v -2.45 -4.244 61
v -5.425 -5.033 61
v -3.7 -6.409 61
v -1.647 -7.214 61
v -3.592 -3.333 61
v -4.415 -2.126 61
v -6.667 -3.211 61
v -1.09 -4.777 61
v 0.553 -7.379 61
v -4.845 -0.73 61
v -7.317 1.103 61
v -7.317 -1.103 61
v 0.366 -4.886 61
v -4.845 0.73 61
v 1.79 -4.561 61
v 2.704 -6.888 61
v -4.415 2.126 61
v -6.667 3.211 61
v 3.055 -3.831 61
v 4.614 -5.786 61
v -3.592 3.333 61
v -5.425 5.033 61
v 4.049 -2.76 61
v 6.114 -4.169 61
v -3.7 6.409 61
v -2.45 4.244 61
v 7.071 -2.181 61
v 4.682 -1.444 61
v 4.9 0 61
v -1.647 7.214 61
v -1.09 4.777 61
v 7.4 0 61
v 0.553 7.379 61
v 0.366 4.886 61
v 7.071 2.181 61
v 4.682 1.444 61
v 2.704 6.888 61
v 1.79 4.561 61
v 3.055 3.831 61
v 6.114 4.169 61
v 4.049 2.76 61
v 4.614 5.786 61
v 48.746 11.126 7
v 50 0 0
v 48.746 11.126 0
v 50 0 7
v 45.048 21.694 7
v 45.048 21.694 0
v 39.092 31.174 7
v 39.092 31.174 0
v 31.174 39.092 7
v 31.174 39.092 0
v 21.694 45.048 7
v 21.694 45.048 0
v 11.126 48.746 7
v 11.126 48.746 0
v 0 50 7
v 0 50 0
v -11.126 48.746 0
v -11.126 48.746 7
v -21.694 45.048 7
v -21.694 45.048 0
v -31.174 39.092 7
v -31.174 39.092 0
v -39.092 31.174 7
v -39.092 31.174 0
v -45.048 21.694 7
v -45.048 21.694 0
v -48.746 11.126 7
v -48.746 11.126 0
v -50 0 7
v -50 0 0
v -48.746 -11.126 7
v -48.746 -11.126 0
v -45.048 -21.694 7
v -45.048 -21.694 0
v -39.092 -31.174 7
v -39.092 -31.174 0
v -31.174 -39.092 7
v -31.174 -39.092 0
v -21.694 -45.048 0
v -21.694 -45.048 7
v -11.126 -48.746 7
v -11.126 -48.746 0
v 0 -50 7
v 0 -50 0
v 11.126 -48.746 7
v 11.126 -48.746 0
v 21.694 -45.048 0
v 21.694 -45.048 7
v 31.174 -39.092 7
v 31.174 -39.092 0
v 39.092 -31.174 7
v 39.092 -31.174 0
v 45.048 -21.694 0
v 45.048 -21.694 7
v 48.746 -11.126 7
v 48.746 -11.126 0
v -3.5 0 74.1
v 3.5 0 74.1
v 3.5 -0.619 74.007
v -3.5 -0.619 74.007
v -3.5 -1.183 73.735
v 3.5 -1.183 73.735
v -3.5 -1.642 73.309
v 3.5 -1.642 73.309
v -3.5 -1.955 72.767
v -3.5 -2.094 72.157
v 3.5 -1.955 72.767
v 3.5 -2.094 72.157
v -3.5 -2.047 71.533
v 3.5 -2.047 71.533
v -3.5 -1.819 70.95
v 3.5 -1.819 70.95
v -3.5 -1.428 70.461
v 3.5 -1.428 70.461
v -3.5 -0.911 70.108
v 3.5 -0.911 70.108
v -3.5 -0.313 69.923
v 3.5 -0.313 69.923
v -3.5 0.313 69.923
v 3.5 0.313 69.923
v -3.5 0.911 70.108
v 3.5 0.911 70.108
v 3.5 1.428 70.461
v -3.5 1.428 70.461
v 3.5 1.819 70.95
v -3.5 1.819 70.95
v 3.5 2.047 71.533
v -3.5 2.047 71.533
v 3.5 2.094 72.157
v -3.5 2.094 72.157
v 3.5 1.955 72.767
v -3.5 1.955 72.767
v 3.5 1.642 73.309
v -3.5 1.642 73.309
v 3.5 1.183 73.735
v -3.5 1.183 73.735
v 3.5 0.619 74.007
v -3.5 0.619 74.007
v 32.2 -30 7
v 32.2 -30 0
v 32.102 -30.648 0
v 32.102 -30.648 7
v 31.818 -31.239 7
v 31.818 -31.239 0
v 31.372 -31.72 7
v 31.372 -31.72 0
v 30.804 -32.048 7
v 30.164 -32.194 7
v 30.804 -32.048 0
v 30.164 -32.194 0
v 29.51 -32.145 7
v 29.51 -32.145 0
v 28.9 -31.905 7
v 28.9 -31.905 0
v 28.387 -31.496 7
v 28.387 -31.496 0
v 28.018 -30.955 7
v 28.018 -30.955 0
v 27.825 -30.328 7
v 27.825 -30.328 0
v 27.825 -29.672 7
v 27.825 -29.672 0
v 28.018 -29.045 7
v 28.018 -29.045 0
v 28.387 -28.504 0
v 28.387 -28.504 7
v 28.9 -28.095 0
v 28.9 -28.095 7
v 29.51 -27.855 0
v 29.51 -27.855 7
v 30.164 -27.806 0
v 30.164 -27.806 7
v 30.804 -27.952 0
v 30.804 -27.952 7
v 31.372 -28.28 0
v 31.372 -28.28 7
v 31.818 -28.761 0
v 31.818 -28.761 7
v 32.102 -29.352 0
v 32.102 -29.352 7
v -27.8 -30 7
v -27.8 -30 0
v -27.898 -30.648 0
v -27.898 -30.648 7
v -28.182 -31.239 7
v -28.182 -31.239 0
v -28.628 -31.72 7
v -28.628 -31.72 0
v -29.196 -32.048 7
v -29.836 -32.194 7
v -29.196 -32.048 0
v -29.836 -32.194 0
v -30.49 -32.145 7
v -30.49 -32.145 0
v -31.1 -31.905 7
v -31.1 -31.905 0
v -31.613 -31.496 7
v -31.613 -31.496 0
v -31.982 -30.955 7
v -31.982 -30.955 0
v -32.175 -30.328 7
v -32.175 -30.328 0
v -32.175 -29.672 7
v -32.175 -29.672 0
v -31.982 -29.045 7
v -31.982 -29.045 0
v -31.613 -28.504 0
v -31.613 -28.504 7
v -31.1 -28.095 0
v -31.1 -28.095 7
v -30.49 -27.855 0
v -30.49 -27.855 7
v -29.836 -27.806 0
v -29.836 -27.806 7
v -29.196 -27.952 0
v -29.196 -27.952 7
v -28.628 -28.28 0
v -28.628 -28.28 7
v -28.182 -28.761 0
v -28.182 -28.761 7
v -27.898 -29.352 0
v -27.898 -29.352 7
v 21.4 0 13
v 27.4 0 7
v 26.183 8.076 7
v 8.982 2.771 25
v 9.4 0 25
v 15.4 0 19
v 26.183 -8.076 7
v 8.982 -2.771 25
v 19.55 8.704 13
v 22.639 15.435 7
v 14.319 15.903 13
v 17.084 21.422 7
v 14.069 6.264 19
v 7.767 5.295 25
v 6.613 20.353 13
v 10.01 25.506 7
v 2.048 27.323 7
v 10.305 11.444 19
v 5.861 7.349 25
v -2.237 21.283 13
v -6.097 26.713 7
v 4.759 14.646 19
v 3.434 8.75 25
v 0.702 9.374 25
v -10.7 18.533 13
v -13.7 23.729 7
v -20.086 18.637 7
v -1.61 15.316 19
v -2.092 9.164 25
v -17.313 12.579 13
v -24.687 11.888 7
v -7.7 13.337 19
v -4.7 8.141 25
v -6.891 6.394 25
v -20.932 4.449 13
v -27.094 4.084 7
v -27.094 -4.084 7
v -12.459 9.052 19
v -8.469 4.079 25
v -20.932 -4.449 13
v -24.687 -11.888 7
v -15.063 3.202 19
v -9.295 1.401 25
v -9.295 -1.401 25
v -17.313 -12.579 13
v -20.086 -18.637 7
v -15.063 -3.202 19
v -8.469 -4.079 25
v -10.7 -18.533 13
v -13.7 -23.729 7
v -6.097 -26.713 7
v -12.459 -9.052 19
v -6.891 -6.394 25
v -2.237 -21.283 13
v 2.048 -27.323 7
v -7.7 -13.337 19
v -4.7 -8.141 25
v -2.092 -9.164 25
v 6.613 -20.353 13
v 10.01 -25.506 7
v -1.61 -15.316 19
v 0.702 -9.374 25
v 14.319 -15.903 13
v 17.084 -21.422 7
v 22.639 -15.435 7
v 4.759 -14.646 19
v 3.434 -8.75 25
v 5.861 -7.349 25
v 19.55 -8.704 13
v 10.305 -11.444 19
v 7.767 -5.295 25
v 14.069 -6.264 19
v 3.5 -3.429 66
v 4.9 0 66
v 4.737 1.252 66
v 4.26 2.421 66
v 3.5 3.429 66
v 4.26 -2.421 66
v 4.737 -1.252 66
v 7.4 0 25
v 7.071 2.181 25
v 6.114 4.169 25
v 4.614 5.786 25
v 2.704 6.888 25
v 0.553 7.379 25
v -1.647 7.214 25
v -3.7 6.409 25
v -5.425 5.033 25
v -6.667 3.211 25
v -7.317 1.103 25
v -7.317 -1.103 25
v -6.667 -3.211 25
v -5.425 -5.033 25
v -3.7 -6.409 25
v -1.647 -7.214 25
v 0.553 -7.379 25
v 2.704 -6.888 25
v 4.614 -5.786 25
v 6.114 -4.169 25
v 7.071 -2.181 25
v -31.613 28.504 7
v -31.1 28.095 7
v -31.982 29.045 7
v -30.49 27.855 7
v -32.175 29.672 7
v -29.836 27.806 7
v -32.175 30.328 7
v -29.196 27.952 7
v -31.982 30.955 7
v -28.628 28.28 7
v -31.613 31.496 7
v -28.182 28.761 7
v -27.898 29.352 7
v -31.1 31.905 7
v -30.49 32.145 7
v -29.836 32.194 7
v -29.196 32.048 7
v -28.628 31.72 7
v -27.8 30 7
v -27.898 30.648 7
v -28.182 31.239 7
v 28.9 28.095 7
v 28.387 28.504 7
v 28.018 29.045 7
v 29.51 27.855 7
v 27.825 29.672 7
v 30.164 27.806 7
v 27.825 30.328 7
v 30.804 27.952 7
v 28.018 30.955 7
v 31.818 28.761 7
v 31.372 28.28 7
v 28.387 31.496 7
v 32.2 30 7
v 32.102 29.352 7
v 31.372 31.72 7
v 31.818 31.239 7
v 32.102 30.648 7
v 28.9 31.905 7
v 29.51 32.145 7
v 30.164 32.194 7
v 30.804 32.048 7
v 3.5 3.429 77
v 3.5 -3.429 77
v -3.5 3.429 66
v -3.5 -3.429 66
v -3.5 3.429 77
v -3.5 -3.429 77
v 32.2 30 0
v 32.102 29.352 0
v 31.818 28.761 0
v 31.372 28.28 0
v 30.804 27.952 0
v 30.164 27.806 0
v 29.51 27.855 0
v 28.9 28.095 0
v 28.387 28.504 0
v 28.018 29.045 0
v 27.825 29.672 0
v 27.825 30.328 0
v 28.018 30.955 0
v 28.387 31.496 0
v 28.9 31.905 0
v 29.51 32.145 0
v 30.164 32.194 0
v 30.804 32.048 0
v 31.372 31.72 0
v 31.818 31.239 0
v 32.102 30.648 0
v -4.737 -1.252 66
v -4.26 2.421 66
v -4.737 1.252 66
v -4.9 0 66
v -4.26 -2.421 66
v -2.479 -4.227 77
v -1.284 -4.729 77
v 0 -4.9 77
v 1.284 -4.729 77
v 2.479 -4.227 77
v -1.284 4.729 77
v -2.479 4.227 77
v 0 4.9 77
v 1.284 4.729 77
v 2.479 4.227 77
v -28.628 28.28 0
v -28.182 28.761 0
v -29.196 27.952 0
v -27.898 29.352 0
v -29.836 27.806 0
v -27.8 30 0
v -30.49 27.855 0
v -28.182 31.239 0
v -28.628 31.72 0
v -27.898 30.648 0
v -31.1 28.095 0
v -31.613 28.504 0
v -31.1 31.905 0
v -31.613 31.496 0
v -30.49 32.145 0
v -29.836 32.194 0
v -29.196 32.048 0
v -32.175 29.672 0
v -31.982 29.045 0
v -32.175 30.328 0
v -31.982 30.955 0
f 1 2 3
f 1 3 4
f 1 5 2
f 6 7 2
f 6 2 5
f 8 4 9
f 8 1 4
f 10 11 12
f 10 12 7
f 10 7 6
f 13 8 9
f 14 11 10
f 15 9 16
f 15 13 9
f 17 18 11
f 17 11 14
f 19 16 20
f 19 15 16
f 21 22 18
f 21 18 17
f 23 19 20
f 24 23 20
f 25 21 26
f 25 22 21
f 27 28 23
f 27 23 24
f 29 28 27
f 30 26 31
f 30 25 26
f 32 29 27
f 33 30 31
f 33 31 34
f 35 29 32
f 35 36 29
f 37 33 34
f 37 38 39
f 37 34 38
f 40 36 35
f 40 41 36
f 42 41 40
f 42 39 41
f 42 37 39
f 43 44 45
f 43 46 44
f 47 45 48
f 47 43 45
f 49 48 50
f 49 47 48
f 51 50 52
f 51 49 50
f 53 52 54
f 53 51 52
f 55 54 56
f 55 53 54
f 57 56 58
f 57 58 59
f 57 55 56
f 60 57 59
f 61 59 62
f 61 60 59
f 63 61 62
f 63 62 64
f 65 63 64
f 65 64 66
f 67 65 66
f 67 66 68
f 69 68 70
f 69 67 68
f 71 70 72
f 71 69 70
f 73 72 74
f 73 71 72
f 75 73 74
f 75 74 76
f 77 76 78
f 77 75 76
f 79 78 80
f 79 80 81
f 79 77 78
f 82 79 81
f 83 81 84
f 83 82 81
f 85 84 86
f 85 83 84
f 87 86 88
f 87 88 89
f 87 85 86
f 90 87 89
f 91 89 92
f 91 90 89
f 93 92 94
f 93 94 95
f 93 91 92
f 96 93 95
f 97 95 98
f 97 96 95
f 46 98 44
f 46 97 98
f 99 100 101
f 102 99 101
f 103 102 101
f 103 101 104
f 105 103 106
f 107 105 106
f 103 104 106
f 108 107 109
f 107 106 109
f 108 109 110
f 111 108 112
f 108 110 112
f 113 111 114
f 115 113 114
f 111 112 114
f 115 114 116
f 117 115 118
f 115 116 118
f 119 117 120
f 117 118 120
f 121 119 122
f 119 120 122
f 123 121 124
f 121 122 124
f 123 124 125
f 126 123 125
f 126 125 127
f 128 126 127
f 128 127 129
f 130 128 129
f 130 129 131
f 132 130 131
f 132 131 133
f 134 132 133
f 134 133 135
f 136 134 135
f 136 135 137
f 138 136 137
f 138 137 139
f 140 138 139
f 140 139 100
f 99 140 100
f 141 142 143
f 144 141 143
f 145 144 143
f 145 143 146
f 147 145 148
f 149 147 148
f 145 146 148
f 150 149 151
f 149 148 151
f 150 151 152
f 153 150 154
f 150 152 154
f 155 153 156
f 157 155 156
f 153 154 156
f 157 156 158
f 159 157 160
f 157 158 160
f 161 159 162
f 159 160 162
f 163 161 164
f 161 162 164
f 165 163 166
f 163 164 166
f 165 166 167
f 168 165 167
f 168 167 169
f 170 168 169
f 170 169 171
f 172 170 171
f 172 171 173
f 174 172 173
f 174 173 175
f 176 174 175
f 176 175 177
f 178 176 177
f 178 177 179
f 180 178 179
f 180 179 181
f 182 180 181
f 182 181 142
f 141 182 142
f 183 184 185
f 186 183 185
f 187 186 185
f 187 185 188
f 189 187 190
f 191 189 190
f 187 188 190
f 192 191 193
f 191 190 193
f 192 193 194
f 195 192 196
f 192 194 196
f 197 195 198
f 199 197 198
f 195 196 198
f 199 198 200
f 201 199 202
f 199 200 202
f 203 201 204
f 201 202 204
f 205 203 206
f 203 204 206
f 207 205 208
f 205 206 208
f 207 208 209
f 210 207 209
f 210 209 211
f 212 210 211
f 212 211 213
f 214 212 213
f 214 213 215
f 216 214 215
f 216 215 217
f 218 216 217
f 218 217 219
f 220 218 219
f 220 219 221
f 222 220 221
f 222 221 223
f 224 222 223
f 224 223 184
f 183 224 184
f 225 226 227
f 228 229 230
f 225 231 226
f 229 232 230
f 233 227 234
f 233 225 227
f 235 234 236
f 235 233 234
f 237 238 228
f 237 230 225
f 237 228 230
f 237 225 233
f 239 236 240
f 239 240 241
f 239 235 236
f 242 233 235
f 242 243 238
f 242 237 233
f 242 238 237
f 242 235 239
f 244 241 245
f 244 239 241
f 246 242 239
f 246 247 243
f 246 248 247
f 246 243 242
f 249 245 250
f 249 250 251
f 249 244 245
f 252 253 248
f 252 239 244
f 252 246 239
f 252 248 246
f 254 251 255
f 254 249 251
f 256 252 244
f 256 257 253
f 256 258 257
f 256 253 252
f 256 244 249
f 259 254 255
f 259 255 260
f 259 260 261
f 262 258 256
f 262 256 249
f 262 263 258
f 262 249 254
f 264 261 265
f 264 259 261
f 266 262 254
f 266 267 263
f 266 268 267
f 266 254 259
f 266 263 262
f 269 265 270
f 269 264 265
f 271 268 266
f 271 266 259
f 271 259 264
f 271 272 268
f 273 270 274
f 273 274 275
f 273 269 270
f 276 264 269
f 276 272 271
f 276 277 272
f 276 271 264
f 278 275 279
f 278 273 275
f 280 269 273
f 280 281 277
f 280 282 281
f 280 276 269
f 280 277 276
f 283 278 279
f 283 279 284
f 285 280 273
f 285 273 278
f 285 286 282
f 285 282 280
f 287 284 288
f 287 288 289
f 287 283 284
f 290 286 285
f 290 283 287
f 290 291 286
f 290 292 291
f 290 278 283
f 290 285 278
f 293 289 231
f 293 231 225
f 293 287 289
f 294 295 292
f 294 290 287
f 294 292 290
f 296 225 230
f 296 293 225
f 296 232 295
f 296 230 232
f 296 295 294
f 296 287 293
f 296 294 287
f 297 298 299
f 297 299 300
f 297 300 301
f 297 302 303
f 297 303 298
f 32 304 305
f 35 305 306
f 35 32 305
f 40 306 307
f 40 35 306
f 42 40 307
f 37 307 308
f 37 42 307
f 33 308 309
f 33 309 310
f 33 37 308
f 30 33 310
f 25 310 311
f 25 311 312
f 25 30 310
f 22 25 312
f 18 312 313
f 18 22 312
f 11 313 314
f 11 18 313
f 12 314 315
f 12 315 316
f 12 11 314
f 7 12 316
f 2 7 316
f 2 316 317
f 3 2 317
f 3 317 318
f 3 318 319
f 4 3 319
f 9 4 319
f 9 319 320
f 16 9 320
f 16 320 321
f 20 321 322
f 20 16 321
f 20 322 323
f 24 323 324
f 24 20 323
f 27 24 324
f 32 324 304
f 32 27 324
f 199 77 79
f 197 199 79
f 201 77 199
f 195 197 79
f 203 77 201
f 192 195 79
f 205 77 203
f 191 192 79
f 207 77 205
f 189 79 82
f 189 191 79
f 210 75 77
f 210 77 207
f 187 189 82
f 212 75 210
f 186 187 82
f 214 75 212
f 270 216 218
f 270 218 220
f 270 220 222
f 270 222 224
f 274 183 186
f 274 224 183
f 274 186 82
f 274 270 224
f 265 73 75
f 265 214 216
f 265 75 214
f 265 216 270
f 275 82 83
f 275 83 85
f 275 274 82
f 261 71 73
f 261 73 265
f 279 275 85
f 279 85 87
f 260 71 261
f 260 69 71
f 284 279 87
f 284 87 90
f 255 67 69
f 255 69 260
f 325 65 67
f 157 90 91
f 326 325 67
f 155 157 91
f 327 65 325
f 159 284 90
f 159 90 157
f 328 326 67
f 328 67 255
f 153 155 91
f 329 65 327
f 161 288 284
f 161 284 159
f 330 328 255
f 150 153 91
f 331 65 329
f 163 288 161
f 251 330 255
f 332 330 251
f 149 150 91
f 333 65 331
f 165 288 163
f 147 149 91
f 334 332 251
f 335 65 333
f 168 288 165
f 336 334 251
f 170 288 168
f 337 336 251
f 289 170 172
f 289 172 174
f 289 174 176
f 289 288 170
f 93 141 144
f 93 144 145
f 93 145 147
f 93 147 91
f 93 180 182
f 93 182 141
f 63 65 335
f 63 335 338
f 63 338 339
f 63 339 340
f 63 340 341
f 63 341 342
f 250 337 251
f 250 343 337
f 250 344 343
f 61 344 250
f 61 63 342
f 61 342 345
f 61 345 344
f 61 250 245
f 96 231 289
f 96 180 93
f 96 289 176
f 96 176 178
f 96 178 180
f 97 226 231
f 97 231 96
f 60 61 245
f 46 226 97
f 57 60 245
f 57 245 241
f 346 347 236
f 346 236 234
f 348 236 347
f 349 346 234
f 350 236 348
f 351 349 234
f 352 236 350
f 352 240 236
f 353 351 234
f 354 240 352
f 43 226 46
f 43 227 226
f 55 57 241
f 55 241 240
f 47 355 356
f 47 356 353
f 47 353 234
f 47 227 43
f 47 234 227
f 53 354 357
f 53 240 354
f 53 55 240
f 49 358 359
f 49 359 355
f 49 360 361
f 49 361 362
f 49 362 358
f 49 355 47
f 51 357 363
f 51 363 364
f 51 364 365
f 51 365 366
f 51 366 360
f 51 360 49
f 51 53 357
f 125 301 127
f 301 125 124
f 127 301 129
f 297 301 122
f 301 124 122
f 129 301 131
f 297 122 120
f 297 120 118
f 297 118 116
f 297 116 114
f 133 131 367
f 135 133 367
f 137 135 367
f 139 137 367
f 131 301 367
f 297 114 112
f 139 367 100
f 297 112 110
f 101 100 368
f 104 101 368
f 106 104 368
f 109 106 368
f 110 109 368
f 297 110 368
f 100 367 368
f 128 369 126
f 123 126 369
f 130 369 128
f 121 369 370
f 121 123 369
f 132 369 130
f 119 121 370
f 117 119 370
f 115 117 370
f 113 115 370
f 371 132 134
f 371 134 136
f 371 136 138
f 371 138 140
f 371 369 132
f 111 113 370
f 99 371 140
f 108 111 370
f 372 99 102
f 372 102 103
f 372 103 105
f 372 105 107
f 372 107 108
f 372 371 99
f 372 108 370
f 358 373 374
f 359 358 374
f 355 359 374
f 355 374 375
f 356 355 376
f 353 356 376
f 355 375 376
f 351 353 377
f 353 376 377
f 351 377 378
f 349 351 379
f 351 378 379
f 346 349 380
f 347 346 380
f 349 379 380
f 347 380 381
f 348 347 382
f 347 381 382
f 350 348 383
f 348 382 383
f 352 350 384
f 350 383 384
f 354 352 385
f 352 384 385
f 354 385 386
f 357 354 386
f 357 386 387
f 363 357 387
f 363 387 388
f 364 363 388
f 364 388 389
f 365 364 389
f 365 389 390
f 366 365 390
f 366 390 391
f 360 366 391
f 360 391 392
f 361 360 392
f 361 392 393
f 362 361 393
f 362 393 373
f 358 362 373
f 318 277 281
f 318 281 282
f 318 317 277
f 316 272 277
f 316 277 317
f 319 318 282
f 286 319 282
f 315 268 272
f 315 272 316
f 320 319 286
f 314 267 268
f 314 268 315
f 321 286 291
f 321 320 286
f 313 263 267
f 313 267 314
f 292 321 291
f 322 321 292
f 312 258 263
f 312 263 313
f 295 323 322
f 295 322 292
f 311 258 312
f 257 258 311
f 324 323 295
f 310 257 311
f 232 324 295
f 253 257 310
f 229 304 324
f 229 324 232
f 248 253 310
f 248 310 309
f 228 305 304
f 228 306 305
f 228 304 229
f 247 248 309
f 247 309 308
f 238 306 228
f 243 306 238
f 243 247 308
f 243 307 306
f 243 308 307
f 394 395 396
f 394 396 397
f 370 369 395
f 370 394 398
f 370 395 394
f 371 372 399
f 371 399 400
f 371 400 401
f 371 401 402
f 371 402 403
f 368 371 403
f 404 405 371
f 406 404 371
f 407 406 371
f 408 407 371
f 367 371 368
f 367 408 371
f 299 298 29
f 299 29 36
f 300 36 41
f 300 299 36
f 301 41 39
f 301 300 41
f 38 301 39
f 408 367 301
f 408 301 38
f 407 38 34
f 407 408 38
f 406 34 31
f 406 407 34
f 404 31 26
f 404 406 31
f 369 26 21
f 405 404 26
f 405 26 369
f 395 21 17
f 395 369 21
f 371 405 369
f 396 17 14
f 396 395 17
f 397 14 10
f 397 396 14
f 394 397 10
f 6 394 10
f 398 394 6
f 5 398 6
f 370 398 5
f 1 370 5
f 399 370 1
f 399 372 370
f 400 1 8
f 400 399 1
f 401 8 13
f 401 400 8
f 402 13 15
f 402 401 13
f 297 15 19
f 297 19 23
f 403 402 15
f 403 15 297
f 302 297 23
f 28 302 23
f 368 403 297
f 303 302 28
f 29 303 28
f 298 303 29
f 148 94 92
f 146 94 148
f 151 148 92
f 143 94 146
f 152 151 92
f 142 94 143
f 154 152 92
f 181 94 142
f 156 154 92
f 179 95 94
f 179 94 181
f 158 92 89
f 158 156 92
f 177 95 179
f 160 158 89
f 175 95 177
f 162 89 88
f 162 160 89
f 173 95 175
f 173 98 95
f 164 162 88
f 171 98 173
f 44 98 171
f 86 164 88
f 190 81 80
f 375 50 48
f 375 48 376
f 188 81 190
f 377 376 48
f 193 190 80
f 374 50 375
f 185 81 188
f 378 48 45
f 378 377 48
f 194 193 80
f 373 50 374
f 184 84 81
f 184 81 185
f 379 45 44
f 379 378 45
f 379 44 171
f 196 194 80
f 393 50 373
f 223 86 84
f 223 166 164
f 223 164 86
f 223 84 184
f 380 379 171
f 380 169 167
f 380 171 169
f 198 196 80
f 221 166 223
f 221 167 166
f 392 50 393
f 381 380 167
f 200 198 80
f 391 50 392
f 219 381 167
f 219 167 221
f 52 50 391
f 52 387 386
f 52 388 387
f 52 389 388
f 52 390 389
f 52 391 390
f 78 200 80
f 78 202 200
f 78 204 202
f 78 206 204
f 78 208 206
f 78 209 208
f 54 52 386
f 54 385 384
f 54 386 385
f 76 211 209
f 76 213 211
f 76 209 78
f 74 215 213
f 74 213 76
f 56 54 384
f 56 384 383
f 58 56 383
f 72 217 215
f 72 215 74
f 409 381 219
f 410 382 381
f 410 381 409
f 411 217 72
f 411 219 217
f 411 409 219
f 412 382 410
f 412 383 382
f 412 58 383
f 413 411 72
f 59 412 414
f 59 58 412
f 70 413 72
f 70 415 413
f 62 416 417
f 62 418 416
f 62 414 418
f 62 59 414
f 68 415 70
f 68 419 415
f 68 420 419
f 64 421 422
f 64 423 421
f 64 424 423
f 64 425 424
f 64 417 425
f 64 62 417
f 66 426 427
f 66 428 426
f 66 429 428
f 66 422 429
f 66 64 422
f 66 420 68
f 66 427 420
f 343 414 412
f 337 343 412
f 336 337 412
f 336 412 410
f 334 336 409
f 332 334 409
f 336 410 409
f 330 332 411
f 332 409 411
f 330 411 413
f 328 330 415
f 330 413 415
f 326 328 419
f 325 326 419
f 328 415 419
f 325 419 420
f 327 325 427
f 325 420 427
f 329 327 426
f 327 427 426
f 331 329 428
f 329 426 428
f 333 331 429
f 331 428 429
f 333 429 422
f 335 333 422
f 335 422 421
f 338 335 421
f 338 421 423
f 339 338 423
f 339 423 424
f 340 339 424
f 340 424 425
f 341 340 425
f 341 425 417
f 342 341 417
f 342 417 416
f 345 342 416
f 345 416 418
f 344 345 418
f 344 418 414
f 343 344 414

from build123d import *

# Parameters (mm, degrees)
SKETCH001_W     = 13.272844
SKETCH001_H     = 19.997346
SKETCH001_W_2   = 7
SKETCH001_H_2   = 12
POCKET_DEPTH    = 11
SKETCH002_R     = 2.1
POCKET001_DEPTH = 53.501
SKETCH003_R     = 2.2
POCKET002_DEPTH = 77.001


with BuildPart() as part:
    # Sketch → Revolution (revolve)
    with BuildSketch(Plane.XZ):
        Polygon((0, 0), (50, 0), (50, 7), (27.4, 7), (9.4, 25), (7.4, 25), (7.4, 61), (4.9, 61), (4.9, 77), (0, 77), align=None)
    revolve(axis=Axis((0, 0, 0), (0, 0, 1)))

    # Sketch001 (on DatumPlane) → Pocket (cut)
    with BuildSketch(Plane(origin=(0, 0, 77), x_dir=(-1, 0, 0), z_dir=(0, 0, 1))):
        Rectangle(SKETCH001_W, SKETCH001_H)
        Rectangle(SKETCH001_W_2, SKETCH001_H_2, mode=Mode.SUBTRACT)
    extrude(amount=-POCKET_DEPTH, mode=Mode.SUBTRACT)

    # Sketch002 (on DatumPlane) → Pocket001 (cut, through all)
    with BuildSketch(Plane(origin=(3.5, 0, 0), x_dir=(0, 0, 1), z_dir=(1, 0, 0))):
        with Locations((72, 0)):
            Circle(SKETCH002_R)
    extrude(amount=-POCKET001_DEPTH, mode=Mode.SUBTRACT)

    # Sketch003 (on DatumPlane) → Pocket002 (cut, through all)
    with BuildSketch(Plane(origin=(0, 0, 0), x_dir=(1, 0, 0), z_dir=(0, 0, -1))):
        with Locations((30, 30)):
            Circle(SKETCH003_R)
        with Locations((-30, 30)):
            Circle(SKETCH003_R)
        with Locations((-30, -30)):
            Circle(SKETCH003_R)
        with Locations((30, -30)):
            Circle(SKETCH003_R)
    extrude(amount=-POCKET002_DEPTH, mode=Mode.SUBTRACT)


solid = part.part
